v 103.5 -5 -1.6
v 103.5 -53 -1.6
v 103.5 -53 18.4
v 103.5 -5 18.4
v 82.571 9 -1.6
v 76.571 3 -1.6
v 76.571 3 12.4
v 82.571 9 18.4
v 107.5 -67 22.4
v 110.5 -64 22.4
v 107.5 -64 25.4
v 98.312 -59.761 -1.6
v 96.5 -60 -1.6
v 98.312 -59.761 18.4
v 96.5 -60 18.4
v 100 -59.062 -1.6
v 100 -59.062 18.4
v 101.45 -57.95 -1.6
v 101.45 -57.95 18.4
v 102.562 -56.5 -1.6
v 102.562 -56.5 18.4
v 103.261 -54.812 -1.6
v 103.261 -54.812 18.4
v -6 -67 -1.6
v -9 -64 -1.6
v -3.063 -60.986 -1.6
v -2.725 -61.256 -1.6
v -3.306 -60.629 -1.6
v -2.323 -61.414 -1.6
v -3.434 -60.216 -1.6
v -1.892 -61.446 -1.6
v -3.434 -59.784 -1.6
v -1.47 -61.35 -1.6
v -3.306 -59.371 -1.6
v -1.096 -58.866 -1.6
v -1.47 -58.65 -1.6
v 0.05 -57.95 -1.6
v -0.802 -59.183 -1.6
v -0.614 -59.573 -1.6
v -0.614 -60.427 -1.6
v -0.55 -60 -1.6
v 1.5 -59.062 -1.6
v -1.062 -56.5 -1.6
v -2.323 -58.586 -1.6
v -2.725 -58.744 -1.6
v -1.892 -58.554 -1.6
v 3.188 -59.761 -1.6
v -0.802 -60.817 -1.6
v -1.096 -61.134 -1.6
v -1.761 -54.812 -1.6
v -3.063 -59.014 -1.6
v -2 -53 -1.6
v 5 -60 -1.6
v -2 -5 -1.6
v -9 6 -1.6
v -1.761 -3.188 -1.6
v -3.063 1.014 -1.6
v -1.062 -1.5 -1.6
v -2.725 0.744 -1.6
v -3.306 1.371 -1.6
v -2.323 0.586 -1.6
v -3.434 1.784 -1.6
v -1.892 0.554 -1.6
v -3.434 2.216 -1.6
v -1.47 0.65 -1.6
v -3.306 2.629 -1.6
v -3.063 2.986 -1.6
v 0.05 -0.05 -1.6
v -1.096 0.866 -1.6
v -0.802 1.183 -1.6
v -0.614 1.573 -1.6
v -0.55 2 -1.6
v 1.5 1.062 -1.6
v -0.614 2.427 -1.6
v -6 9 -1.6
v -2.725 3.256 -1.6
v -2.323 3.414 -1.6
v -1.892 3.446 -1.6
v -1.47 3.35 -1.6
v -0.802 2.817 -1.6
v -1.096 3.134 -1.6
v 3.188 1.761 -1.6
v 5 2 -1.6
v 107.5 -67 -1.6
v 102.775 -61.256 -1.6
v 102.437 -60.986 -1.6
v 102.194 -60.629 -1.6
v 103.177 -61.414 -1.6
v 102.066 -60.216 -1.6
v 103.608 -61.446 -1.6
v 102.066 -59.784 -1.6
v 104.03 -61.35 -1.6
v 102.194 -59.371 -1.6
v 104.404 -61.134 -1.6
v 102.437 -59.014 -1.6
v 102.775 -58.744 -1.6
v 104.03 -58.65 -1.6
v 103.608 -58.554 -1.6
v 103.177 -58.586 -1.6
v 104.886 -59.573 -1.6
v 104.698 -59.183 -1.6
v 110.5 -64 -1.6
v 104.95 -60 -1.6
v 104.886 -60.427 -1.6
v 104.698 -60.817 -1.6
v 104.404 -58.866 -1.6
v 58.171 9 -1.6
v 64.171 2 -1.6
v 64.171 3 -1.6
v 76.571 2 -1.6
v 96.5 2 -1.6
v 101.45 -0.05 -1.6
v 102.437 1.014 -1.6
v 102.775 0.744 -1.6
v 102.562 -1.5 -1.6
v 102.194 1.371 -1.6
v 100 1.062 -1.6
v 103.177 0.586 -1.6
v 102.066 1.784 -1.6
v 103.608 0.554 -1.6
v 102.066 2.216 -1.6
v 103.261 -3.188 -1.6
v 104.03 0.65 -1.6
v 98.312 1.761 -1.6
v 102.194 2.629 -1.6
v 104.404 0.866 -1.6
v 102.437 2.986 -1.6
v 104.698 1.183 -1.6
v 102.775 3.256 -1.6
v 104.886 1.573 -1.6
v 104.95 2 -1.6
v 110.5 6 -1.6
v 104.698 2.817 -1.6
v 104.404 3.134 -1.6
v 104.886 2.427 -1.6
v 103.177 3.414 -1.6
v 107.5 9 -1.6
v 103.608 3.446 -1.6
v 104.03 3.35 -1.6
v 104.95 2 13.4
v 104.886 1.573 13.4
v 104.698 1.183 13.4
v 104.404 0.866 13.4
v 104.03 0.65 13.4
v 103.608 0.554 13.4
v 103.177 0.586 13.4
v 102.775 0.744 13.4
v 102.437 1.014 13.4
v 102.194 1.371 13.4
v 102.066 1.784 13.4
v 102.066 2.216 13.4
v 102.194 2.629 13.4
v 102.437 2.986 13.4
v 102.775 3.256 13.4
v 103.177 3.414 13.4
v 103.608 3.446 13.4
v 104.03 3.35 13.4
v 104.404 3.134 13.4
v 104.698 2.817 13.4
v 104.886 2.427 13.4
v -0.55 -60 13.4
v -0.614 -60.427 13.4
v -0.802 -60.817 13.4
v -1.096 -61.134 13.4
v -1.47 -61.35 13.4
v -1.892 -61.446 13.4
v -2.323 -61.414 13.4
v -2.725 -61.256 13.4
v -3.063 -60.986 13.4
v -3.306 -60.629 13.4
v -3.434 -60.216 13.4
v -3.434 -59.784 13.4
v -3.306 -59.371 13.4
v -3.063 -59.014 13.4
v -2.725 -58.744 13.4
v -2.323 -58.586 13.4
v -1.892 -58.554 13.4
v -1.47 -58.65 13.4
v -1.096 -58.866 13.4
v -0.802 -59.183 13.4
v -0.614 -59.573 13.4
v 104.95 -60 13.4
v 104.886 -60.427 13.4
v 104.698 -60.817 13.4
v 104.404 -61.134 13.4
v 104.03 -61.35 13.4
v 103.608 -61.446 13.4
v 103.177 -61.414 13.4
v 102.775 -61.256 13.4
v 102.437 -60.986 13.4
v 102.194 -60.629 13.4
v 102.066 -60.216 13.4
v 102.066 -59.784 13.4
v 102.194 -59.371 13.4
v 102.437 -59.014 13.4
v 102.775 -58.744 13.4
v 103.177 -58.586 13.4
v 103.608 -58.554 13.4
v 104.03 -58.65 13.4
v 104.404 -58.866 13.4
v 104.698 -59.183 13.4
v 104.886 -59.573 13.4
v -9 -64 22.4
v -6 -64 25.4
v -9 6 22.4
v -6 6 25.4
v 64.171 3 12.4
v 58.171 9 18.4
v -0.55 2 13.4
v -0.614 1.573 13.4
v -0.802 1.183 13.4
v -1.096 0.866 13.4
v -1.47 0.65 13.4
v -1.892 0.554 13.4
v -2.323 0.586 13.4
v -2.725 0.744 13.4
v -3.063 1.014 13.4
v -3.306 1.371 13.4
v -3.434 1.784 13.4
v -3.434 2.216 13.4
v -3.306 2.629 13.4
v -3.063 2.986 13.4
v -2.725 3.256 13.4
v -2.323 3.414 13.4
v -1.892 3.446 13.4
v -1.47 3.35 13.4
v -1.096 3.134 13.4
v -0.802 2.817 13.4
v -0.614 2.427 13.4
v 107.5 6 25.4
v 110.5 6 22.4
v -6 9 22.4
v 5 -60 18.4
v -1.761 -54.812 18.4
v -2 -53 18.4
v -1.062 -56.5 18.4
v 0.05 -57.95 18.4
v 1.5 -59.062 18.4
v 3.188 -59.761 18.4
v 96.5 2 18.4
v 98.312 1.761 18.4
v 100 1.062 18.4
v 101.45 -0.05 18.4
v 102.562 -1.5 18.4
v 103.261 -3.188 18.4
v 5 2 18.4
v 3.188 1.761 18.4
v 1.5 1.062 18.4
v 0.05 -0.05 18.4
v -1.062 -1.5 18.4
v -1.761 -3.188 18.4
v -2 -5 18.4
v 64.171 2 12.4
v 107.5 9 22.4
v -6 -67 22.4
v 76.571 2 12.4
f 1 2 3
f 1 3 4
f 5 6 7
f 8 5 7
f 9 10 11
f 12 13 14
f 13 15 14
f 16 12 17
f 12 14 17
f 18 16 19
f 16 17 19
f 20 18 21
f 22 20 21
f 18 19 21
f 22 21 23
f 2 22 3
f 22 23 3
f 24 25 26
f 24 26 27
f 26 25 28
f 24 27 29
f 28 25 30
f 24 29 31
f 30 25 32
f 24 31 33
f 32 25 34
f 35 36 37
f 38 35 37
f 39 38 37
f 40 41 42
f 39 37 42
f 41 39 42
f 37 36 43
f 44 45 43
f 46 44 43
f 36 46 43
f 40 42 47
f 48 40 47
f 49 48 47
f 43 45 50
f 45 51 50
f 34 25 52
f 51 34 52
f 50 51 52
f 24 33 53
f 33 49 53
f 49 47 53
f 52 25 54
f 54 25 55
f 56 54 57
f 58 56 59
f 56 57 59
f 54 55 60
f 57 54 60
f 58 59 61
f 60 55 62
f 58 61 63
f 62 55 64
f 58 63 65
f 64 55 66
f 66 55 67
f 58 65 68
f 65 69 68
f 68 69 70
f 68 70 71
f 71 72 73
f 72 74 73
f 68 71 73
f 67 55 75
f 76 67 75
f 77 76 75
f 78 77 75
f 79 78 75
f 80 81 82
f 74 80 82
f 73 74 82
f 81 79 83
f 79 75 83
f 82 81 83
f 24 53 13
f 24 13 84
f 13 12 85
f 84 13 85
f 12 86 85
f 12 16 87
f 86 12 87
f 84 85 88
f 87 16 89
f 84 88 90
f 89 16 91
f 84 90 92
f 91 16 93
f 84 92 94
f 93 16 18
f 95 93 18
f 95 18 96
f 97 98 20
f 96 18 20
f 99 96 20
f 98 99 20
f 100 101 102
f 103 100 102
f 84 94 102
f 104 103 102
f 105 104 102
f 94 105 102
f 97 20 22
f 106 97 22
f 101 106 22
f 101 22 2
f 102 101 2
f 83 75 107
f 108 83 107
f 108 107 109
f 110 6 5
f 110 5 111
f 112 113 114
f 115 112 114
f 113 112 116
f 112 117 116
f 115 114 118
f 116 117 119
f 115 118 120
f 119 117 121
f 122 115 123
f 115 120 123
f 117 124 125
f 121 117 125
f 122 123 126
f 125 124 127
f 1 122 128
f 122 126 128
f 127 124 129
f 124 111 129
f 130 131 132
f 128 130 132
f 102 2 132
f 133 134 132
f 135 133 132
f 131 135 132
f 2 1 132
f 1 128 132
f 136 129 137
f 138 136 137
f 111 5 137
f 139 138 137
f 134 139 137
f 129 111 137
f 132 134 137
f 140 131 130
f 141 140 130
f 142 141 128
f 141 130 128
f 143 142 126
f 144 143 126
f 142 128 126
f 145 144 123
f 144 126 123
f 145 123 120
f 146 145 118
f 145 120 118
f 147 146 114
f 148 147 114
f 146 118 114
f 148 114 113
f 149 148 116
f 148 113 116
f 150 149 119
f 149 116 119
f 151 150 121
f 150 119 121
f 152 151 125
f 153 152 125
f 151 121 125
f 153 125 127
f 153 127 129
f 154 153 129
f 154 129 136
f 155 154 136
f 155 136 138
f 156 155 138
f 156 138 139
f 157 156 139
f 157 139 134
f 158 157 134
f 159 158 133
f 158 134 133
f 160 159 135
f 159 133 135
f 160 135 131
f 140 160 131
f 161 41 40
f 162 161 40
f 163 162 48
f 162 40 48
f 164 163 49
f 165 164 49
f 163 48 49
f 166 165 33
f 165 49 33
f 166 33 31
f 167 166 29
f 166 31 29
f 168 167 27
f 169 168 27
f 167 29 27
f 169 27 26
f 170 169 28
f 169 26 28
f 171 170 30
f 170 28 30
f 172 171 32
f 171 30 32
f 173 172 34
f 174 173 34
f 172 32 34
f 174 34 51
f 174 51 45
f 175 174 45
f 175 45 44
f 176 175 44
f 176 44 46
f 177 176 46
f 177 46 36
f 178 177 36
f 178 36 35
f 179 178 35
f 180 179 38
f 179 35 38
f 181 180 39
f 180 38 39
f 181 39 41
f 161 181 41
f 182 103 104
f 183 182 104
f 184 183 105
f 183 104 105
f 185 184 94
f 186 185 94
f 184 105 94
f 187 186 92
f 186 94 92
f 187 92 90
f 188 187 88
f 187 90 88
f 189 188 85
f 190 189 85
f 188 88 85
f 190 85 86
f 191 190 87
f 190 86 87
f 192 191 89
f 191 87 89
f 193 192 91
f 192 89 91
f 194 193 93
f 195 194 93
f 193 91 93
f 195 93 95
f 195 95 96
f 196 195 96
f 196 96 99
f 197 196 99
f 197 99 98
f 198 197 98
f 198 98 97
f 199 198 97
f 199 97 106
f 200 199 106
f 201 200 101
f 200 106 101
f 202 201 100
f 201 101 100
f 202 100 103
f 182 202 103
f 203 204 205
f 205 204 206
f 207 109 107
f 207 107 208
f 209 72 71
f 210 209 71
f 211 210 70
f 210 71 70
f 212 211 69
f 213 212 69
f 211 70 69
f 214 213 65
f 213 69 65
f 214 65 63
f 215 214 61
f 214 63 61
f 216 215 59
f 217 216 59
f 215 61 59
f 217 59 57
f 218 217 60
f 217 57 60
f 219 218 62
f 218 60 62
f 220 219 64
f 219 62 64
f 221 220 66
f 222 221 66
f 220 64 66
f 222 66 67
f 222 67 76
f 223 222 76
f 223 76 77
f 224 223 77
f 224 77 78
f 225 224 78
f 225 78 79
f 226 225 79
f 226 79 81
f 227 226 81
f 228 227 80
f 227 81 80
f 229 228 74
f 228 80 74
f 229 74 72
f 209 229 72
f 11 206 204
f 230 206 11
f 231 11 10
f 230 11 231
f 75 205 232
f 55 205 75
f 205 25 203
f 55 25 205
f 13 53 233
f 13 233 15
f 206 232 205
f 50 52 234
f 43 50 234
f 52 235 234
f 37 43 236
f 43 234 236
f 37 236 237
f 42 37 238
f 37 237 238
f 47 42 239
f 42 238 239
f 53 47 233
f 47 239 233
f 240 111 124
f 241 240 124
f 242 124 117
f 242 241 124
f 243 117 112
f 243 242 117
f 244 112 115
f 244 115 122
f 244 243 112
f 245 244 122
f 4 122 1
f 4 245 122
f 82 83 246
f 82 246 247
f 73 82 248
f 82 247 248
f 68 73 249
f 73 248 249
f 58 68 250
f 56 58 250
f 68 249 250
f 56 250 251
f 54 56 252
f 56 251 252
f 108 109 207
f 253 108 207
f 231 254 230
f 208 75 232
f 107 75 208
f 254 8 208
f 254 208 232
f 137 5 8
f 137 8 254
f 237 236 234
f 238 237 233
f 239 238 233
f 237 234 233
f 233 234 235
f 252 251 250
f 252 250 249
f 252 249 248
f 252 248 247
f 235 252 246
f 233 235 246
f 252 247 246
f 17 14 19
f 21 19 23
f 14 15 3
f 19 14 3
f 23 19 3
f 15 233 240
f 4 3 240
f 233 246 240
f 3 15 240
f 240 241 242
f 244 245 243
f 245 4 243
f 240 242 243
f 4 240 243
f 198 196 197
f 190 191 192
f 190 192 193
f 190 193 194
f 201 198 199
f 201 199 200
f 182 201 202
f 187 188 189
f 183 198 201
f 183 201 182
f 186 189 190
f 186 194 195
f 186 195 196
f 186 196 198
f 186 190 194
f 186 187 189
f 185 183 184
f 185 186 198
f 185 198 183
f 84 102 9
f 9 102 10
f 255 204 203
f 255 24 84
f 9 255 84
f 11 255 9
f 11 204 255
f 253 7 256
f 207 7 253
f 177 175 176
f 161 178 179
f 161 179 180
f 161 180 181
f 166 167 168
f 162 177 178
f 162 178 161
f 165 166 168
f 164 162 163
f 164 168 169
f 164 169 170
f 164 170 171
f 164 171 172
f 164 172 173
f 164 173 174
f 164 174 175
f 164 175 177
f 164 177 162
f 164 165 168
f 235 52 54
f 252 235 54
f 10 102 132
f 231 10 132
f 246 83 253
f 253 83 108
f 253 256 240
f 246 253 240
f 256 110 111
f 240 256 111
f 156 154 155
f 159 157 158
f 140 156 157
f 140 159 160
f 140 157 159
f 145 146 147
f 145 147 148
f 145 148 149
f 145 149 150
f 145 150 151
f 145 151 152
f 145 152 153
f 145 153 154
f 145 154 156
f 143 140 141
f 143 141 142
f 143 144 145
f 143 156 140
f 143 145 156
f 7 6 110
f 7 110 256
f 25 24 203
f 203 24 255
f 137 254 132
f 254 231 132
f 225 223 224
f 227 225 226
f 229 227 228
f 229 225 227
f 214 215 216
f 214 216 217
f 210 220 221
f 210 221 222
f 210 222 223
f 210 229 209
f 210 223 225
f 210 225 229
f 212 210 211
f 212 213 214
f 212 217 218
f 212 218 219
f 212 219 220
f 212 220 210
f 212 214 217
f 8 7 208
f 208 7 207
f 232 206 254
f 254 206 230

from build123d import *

# Parameters (mm, degrees)
SKETCH033_W     = 119.5
SKETCH033_H     = 76
SKETCH033_W_2   = 105.5
SKETCH033_H_2   = 62
PAD011_DEPTH    = 20
SKETCH034_W     = 119.5
SKETCH034_H     = 76
PAD012_DEPTH    = 7
SKETCH035_W     = 12.399995
SKETCH035_H     = 14
POCKET012_DEPTH = 7
CHAMFER_SIZE    = 6
FILLET_R        = 7
SKETCH037_R     = 1.45
POCKET013_DEPTH = 15
CHAMFER006_SIZE = 3


with BuildPart() as part:
    # Sketch033 (on Face1 of Binder012) → Pad011 (new body)
    with BuildSketch(Plane.XY.offset(-1.6)):
        with Locations((50.75, -29)):
            Rectangle(SKETCH033_W, SKETCH033_H)
        with Locations((50.75, -29)):
            Rectangle(SKETCH033_W_2, SKETCH033_H_2, mode=Mode.SUBTRACT)
    extrude(amount=PAD011_DEPTH)

    # Sketch034 (on Face10 of Pad011) → Pad012 (join)
    with BuildSketch(Plane.XY.offset(18.4)):
        with Locations((50.75, -29)):
            Rectangle(SKETCH034_W, SKETCH034_H)
    extrude(amount=PAD012_DEPTH)

    # Sketch035 (on Face9 of Pad012) → Pocket012 (cut)
    with BuildSketch(Plane(origin=(0, 9, 0), x_dir=(-1, 0, 0), z_dir=(0, 1, 0))):
        with Locations((-70.371465, 5.4)):
            Rectangle(SKETCH035_W, SKETCH035_H)
    extrude(amount=-POCKET012_DEPTH, mode=Mode.SUBTRACT)

    # Chamfer
    chamfer_edges = [part.edges().sort_by_distance(p)[0] for p in [
        (70.371465, 9, 12.4),
        (64.171468, 9, 5.4),
        (76.571463, 9, 5.4),
    ]]
    chamfer(chamfer_edges, length=CHAMFER_SIZE)

    # Fillet
    fillet_edges = [part.edges().sort_by_distance(p)[0] for p in [
        (103.5, 2, 8.4),
        (-2, 2, 8.4),
        (-2, -60, 8.4),
        (103.5, -60, 8.4),
    ]]
    fillet(fillet_edges, radius=FILLET_R)

    # Sketch037 (on Face1 of Fillet) → Pocket013 (cut)
    with BuildSketch(Plane(origin=(0, 0, -1.6), x_dir=(1, 0, 0), z_dir=(0, 0, -1))):
        with Locations((-2, 60)):
            Circle(SKETCH037_R)
        with Locations((103.5, 60)):
            Circle(SKETCH037_R)
        with Locations((103.5, -2)):
            Circle(SKETCH037_R)
        with Locations((-2, -2)):
            Circle(SKETCH037_R)
    extrude(amount=-POCKET013_DEPTH, mode=Mode.SUBTRACT)

    # Chamfer006
    chamfer006_edges = [part.edges().sort_by_distance(p)[0] for p in [
        (110.5, 9, 11.9),
        (50.75, 9, 25.4),
        (110.5, -29, 25.4),
        (110.5, -67, 11.9),
        (50.75, -67, 25.4),
        (-9, 9, 11.9),
        (-9, -29, 25.4),
        (-9, -67, 11.9),
    ]]
    chamfer(chamfer006_edges, length=CHAMFER006_SIZE)


solid = part.part
